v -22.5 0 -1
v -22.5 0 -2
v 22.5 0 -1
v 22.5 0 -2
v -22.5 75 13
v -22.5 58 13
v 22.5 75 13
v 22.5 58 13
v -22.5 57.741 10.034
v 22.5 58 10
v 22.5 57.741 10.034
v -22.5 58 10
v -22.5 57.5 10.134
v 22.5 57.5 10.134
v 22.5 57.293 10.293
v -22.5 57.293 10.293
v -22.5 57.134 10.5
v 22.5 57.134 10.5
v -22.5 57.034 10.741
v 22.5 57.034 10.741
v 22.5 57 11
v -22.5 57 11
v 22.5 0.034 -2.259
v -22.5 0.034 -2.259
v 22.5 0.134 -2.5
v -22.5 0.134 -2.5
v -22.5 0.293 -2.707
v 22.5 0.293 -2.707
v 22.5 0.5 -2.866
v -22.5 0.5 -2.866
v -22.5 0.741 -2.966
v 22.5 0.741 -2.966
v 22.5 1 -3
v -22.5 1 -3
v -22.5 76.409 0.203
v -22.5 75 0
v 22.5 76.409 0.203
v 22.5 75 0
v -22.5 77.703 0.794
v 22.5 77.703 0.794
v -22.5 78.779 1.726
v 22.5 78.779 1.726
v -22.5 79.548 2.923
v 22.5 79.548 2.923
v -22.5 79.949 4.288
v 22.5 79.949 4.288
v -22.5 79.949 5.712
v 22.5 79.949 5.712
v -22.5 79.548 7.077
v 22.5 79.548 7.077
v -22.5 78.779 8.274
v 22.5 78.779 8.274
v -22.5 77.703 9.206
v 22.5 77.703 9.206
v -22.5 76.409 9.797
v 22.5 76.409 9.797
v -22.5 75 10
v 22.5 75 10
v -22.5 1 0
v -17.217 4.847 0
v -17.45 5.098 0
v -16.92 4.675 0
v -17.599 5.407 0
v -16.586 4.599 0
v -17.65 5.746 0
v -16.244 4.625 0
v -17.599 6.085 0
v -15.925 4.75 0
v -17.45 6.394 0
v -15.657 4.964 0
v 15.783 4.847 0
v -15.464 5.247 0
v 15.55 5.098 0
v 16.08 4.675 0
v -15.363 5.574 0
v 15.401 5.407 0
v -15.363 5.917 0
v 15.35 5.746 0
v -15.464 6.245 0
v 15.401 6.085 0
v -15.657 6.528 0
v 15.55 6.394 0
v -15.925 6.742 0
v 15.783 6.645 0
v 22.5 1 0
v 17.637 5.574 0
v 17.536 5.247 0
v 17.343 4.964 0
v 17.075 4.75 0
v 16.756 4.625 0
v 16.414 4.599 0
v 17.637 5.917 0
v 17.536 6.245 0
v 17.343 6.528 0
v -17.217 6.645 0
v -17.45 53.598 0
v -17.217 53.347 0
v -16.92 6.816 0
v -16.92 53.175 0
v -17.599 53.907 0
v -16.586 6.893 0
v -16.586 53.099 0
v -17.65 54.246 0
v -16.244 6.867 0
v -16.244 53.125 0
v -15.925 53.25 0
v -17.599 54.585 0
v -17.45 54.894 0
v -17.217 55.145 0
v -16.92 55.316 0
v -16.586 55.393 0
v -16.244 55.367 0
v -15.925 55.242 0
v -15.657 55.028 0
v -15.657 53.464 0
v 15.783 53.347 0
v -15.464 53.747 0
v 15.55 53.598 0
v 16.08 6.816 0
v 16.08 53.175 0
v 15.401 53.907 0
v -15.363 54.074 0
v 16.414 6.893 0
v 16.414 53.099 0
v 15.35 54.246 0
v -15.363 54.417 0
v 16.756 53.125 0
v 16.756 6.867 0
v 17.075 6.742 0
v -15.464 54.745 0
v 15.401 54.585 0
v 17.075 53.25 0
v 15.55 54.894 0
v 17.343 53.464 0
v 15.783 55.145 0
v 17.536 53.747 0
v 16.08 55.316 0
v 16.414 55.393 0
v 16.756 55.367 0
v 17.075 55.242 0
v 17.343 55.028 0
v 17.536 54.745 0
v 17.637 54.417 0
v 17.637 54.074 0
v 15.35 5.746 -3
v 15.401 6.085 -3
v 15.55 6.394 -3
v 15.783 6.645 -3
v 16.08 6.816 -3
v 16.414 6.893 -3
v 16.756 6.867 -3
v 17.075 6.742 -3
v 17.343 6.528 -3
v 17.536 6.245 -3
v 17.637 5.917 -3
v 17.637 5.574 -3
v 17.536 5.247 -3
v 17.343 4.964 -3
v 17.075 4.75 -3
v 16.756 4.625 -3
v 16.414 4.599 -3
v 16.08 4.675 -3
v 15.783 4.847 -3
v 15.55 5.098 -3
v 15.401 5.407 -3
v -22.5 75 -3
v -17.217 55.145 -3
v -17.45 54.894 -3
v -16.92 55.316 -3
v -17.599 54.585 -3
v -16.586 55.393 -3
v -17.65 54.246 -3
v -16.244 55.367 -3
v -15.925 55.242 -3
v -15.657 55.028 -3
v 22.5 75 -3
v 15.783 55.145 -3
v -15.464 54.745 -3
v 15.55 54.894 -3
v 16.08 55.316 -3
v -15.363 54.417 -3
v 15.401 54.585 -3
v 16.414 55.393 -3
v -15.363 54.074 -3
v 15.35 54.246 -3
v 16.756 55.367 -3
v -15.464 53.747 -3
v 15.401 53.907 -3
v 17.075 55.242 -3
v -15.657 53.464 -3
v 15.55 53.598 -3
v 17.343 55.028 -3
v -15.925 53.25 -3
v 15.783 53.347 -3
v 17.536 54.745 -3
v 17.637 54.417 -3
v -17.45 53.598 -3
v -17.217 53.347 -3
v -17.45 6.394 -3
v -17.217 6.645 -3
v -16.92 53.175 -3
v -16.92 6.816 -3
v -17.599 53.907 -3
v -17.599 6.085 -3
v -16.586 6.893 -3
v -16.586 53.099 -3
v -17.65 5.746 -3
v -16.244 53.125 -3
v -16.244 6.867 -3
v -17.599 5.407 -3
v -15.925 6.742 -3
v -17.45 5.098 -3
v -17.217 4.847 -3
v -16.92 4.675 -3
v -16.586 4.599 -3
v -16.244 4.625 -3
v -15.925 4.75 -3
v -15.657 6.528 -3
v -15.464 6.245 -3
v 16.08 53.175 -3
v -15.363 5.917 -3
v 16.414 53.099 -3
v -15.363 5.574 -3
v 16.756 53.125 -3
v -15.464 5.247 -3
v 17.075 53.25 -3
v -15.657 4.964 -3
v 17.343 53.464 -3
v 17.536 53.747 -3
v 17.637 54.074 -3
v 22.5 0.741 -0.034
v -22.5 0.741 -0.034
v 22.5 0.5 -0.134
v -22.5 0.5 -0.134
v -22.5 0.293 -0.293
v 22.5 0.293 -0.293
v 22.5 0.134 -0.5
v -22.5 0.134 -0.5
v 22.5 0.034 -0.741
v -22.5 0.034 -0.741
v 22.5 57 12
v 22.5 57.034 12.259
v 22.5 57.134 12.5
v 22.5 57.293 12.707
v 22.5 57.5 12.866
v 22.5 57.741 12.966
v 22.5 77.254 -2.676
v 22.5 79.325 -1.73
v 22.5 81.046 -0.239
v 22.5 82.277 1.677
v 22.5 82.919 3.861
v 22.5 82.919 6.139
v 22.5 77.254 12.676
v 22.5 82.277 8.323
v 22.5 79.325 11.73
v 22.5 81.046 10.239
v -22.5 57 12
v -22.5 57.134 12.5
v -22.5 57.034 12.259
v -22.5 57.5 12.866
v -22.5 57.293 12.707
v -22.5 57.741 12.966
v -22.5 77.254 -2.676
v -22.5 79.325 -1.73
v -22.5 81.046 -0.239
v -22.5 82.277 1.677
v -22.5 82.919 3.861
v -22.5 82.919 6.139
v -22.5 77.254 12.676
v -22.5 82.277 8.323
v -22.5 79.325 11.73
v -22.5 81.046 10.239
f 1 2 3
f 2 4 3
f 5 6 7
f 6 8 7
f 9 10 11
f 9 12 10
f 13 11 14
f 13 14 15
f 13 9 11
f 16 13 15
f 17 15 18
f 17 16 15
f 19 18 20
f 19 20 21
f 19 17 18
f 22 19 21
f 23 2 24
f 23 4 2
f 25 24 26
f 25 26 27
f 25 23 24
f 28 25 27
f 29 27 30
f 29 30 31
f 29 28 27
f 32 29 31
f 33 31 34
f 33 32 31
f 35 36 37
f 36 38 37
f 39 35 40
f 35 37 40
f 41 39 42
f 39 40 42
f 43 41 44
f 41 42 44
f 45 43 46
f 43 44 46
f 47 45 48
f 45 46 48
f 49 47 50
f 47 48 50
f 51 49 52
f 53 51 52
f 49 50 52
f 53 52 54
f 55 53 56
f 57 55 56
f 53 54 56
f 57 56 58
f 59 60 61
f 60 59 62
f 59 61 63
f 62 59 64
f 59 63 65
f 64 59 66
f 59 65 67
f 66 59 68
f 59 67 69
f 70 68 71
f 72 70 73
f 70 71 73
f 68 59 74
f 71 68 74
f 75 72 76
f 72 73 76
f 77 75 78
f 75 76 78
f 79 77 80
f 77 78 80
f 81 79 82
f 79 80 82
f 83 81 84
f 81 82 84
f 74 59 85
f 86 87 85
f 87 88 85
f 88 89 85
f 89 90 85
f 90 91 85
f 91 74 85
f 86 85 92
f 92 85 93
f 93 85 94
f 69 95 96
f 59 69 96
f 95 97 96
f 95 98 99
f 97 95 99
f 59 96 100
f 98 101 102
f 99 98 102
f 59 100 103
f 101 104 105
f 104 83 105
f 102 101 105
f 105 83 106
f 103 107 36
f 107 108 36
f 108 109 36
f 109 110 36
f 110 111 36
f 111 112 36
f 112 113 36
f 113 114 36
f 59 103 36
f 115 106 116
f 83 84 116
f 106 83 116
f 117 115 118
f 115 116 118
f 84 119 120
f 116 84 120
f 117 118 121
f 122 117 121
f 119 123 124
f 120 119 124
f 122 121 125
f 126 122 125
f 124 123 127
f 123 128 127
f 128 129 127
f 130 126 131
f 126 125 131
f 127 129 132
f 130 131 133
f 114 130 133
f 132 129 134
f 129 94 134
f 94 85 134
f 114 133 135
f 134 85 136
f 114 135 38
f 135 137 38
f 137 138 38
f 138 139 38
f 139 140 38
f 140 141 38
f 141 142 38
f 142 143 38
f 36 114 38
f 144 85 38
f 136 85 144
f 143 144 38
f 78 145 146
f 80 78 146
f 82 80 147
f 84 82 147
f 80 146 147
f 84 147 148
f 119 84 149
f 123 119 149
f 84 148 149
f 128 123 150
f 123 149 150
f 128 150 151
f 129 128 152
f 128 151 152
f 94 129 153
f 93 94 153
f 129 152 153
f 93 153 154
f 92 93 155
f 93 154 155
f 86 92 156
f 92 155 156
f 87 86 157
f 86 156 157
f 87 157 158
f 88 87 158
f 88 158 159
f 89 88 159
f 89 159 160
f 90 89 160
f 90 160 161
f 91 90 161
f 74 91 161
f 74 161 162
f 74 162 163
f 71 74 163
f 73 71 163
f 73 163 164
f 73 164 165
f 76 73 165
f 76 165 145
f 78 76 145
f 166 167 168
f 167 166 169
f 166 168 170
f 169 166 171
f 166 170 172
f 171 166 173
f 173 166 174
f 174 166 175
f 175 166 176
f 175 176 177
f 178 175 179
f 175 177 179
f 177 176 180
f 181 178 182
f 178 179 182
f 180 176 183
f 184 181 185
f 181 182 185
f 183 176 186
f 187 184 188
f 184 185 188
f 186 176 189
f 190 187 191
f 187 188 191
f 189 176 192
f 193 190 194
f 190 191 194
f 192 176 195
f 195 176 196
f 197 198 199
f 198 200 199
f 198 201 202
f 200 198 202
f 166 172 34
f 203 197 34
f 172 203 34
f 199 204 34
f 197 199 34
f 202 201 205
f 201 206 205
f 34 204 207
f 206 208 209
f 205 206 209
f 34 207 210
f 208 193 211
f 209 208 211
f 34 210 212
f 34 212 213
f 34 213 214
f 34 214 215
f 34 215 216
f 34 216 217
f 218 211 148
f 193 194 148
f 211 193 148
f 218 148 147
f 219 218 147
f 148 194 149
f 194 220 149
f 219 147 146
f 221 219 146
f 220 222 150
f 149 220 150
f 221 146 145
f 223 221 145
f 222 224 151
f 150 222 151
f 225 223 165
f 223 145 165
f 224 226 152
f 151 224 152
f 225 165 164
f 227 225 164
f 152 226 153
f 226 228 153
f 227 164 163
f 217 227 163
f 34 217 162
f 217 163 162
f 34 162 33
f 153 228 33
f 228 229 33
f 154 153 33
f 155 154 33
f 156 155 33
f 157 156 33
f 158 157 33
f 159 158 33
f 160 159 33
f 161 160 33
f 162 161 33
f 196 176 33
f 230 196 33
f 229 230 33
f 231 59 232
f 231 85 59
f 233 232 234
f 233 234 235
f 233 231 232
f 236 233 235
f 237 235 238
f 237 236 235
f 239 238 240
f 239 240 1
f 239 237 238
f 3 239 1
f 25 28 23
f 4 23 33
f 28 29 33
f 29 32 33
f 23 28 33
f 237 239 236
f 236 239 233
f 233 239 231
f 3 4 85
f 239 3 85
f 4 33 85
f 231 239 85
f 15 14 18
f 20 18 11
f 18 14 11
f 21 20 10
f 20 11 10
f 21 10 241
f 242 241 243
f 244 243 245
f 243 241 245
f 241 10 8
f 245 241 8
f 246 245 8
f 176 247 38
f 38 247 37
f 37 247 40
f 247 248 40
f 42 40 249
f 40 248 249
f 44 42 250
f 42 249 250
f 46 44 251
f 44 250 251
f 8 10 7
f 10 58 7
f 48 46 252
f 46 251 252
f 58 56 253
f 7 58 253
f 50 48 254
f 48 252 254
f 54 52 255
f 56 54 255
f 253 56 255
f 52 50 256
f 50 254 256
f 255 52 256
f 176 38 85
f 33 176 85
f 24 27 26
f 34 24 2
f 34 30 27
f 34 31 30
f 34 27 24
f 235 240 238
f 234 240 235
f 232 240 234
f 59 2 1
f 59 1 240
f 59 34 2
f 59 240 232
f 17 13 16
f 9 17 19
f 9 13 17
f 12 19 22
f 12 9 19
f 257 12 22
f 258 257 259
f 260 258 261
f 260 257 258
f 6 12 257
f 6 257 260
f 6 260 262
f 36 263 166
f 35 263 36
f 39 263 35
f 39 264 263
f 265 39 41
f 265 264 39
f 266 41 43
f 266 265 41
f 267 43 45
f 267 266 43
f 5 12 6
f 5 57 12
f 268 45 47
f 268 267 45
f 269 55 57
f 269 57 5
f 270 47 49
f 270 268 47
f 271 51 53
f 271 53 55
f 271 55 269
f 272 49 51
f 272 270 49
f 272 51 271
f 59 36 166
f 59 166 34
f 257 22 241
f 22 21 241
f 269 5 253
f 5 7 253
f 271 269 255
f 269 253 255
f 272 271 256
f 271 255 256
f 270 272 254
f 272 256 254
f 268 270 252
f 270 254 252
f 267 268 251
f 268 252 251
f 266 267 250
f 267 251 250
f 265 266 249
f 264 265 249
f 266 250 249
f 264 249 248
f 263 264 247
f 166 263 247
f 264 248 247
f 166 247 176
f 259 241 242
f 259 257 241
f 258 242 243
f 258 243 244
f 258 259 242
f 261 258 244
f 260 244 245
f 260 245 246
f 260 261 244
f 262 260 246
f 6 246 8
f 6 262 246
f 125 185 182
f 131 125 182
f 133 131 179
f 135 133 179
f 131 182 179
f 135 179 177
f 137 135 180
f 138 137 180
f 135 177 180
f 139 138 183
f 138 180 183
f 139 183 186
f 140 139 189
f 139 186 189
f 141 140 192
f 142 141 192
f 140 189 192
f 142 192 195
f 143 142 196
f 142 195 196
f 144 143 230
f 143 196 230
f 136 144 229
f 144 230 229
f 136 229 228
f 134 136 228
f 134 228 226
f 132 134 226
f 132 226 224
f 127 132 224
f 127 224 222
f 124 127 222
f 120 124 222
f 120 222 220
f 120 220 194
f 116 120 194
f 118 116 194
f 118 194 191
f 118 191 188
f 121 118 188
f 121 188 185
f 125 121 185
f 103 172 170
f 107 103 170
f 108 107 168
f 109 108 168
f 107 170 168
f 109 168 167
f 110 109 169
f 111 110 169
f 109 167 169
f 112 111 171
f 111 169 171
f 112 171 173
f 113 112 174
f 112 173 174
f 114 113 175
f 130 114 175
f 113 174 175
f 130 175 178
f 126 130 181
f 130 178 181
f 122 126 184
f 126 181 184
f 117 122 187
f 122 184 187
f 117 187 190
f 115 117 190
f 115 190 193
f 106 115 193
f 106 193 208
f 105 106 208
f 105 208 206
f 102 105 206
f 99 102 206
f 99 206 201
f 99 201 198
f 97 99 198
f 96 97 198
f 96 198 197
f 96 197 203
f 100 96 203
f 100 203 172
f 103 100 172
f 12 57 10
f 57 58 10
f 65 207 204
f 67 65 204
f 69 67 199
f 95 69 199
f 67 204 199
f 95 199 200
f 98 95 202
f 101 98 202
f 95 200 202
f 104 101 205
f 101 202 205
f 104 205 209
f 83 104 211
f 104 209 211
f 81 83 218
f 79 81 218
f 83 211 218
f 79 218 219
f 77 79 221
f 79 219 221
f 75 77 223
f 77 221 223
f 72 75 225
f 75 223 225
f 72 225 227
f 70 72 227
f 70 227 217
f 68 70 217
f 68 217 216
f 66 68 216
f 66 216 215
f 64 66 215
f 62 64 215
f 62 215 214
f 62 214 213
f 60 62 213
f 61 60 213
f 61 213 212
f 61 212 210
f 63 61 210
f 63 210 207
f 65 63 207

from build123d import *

# Parameters (mm, degrees)
EXTRUDE_THIN1_DEPTH = 22.5
SKETCH2_R           = 1.15
CUT_EXTRUDE1_DEPTH  = 88.471423905
FILLET1_R           = 1


with BuildPart() as part:
    # Sketch1 → Extrude-Thin1 (new, symmetric)
    with BuildSketch(Plane(origin=(0, 0, 0), x_dir=(0, 0, -1), z_dir=(1, 0, 0))):
        with BuildLine():
            Line((0, 0), (0, 75))
            ThreePointArc((0, 75), (-5, 80), (-10, 75))
            Line((-10, 75), (-10, 57))
            Line((-10, 57), (-13, 57))
            Line((-13, 57), (-13, 75))
            ThreePointArc((-13, 75), (-5, 83), (3, 75))
            Line((3, 75), (3, 0))
            Line((3, 0), (0, 0))
        make_face()
    extrude(amount=EXTRUDE_THIN1_DEPTH, both=True)

    # Sketch2 → Cut-Extrude1 (cut, through all)
    with BuildSketch(Plane(origin=(0, 0, -3), x_dir=(-1, 0, 0), z_dir=(0, 0, -1))):
        with Locations((-16.5, 54.245785589)):
            Circle(SKETCH2_R)
        with Locations((16.5, 54.245785589)):
            Circle(SKETCH2_R)
        with Locations((16.5, 5.745785589)):
            Circle(SKETCH2_R)
        with Locations((-16.5, 5.745785589)):
            Circle(SKETCH2_R)
    extrude(amount=-CUT_EXTRUDE1_DEPTH, mode=Mode.SUBTRACT)

    # Fillet1
    fillet1_edges = [part.edges().sort_by_distance(p)[0] for p in [
        (0, 0, -3),
        (0, 0, 0),
        (0, 57, 10),
        (0, 57, 13),
    ]]
    fillet(fillet1_edges, radius=FILLET1_R)


solid = part.part
